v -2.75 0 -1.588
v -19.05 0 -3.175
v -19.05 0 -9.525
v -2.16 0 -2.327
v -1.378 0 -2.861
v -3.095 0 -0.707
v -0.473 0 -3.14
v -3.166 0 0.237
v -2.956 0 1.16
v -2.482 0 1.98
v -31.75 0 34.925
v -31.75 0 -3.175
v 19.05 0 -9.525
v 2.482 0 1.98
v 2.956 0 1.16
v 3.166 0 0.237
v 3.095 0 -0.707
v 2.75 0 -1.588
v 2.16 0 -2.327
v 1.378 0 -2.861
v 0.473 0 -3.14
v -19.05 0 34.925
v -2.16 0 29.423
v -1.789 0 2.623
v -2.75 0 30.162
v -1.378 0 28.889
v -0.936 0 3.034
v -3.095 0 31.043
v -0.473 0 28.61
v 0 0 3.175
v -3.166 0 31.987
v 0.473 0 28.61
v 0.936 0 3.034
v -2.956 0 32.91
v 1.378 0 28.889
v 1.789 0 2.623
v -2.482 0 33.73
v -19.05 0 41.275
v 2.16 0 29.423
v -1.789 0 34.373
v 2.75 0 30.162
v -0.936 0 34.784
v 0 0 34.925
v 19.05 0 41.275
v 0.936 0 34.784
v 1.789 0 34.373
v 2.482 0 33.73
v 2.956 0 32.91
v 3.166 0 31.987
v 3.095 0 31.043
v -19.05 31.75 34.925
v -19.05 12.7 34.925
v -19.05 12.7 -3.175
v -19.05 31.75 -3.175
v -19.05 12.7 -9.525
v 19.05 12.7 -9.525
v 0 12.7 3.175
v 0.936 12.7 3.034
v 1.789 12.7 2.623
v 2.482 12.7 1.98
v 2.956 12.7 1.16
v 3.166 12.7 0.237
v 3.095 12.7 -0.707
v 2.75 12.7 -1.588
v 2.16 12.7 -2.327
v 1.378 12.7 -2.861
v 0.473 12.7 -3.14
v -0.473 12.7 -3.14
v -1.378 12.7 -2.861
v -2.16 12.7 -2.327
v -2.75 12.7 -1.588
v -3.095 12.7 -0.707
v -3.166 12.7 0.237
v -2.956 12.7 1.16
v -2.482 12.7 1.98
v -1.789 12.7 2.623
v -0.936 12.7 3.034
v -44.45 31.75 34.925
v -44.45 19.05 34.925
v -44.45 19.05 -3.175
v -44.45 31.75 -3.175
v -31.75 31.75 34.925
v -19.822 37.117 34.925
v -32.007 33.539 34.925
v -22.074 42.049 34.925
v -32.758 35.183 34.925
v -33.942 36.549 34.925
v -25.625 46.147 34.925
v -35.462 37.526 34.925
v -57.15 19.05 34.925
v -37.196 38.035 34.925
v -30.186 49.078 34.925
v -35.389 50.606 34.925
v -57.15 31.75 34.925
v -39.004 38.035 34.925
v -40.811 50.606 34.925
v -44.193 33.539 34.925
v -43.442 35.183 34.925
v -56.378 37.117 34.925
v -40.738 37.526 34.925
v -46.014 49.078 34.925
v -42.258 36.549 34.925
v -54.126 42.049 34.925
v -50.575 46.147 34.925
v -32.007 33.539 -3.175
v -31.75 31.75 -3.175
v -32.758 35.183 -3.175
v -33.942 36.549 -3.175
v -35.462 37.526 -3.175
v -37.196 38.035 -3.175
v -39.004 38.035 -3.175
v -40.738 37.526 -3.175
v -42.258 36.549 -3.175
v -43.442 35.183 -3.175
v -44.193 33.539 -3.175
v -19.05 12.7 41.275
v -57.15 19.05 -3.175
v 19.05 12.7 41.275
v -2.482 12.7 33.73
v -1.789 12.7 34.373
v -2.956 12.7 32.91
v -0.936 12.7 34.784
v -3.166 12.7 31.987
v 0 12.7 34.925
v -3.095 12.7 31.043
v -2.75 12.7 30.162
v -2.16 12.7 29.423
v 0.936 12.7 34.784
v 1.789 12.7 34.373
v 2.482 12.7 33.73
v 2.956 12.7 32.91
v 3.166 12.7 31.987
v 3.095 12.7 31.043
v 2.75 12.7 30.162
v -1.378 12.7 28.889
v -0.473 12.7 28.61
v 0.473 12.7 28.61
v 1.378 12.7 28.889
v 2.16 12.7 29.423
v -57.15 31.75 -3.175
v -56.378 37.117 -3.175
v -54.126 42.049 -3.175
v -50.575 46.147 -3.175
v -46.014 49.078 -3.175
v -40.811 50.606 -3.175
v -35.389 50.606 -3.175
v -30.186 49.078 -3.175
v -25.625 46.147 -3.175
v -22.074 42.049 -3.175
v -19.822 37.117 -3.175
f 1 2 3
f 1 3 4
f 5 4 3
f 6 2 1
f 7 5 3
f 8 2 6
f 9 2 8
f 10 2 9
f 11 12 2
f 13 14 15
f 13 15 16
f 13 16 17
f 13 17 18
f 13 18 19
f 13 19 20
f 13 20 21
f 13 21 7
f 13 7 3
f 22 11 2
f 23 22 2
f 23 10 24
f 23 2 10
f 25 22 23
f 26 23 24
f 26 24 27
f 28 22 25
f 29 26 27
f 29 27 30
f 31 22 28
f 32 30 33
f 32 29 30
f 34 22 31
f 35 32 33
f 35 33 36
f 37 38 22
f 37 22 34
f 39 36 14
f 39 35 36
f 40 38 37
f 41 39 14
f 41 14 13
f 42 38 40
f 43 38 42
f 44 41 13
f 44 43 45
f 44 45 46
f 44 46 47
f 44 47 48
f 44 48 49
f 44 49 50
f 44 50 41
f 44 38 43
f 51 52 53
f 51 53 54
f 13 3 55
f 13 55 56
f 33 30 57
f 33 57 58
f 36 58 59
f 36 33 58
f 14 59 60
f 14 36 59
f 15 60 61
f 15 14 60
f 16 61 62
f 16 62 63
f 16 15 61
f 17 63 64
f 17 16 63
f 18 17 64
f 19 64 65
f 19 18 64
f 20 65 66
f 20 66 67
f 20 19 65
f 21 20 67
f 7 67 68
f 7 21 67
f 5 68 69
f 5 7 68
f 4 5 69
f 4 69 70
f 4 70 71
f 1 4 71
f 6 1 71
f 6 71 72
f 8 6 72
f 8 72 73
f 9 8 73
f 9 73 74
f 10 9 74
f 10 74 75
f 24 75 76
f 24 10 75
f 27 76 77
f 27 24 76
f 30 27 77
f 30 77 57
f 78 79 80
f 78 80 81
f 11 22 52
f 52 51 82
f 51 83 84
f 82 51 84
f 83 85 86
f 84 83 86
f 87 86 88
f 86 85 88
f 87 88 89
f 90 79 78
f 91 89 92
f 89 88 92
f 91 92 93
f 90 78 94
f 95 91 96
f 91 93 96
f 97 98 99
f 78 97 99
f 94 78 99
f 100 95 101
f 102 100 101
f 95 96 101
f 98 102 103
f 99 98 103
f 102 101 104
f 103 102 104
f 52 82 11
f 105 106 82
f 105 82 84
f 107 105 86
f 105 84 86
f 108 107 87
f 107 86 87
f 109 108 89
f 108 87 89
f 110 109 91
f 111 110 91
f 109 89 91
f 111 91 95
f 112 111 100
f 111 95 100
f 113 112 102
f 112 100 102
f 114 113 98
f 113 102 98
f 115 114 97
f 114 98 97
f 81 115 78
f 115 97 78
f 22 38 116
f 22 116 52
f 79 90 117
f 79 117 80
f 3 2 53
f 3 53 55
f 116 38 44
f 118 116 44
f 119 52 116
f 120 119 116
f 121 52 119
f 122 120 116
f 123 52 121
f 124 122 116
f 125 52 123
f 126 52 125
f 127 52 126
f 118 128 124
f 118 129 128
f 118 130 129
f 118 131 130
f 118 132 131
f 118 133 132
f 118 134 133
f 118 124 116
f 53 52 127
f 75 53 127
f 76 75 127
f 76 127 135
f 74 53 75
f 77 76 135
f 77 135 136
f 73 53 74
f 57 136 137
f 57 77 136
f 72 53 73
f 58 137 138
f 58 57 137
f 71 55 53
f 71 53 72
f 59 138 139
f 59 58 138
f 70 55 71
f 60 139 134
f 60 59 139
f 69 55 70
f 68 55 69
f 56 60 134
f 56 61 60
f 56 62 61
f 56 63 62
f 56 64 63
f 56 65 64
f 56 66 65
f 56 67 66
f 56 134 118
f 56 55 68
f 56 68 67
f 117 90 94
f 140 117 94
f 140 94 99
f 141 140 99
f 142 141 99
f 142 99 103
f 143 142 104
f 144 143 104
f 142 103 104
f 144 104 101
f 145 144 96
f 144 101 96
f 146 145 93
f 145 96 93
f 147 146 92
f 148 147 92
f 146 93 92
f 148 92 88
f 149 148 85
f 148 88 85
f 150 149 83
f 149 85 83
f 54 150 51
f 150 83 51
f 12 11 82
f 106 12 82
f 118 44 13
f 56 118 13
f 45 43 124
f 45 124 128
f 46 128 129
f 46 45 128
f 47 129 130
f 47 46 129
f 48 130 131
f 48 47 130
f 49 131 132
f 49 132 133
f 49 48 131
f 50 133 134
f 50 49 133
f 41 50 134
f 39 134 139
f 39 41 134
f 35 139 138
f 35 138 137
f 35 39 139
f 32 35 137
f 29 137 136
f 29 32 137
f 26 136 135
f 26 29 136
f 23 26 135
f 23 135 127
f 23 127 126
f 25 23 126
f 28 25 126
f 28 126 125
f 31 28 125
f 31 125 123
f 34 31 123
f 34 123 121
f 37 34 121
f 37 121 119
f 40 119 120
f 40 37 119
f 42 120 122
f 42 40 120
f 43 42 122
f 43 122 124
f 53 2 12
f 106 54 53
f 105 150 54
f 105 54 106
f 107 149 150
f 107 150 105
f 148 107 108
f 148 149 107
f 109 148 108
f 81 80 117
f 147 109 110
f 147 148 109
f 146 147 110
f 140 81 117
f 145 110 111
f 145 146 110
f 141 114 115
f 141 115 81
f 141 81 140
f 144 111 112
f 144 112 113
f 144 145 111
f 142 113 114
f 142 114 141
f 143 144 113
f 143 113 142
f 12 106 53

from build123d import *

# Parameters (mm, degrees)
SKETCH1_W           = 38.1
SKETCH1_H           = 19.05
SKETCH1_R           = 3.175
SKETCH1_H_2         = 12.7
BOSS_EXTRUDE2_DEPTH = 12.7
SKETCH3_W           = 12.7
SKETCH3_H           = 31.75
SKETCH3_H_2         = 12.7
BOSS_EXTRUDE3_DEPTH = 38.1


with BuildPart() as part:
    # Sketch1 → Boss-Extrude2 (new body)
    # profile 1 of 3: a face of its own
    with BuildSketch(Plane(origin=(0, 0, 0), x_dir=(1, 0, 0), z_dir=(0, 1, 0))):
        Rectangle(SKETCH1_W, SKETCH1_H)
        with Locations(Location((0, 0, 0), (0, 0, 270))):
            Circle(SKETCH1_R, mode=Mode.SUBTRACT)
    # profile 2 of 3: a face of its own
    with BuildSketch(Plane(origin=(0, 0, 0), x_dir=(1, 0, 0), z_dir=(0, 1, 0))):
        with Locations((0, -15.875)):
            Rectangle(SKETCH1_W, SKETCH1_H_2)
    # profile 3 of 3: a face of its own
    with BuildSketch(Plane(origin=(0, 0, 0), x_dir=(1, 0, 0), z_dir=(0, 1, 0))):
        with Locations((0, -31.75)):
            Rectangle(SKETCH1_W, SKETCH1_H)
        with Locations(Location((0, -31.75, 0), (0, 0, 270))):
            Circle(SKETCH1_R, mode=Mode.SUBTRACT)
    extrude(amount=BOSS_EXTRUDE2_DEPTH)

    # Sketch3 → Boss-Extrude3 (add)
    with BuildSketch(Plane.XY.offset(34.925)):
        with BuildLine():
            ThreePointArc((-31.75, 31.75), (-38.1, 38.1), (-44.45, 31.75))
            Line((-44.45, 31.75), (-57.15, 31.75))
            ThreePointArc((-57.15, 31.75), (-38.1, 50.8), (-19.05, 31.75))
            Line((-19.05, 31.75), (-31.75, 31.75))
        make_face()
        with Locations((-25.4, 15.875)):
            Rectangle(SKETCH3_W, SKETCH3_H)
        with Locations((-50.8, 25.4)):
            Rectangle(SKETCH3_W, SKETCH3_H_2)
    extrude(amount=-BOSS_EXTRUDE3_DEPTH)


solid = part.part
